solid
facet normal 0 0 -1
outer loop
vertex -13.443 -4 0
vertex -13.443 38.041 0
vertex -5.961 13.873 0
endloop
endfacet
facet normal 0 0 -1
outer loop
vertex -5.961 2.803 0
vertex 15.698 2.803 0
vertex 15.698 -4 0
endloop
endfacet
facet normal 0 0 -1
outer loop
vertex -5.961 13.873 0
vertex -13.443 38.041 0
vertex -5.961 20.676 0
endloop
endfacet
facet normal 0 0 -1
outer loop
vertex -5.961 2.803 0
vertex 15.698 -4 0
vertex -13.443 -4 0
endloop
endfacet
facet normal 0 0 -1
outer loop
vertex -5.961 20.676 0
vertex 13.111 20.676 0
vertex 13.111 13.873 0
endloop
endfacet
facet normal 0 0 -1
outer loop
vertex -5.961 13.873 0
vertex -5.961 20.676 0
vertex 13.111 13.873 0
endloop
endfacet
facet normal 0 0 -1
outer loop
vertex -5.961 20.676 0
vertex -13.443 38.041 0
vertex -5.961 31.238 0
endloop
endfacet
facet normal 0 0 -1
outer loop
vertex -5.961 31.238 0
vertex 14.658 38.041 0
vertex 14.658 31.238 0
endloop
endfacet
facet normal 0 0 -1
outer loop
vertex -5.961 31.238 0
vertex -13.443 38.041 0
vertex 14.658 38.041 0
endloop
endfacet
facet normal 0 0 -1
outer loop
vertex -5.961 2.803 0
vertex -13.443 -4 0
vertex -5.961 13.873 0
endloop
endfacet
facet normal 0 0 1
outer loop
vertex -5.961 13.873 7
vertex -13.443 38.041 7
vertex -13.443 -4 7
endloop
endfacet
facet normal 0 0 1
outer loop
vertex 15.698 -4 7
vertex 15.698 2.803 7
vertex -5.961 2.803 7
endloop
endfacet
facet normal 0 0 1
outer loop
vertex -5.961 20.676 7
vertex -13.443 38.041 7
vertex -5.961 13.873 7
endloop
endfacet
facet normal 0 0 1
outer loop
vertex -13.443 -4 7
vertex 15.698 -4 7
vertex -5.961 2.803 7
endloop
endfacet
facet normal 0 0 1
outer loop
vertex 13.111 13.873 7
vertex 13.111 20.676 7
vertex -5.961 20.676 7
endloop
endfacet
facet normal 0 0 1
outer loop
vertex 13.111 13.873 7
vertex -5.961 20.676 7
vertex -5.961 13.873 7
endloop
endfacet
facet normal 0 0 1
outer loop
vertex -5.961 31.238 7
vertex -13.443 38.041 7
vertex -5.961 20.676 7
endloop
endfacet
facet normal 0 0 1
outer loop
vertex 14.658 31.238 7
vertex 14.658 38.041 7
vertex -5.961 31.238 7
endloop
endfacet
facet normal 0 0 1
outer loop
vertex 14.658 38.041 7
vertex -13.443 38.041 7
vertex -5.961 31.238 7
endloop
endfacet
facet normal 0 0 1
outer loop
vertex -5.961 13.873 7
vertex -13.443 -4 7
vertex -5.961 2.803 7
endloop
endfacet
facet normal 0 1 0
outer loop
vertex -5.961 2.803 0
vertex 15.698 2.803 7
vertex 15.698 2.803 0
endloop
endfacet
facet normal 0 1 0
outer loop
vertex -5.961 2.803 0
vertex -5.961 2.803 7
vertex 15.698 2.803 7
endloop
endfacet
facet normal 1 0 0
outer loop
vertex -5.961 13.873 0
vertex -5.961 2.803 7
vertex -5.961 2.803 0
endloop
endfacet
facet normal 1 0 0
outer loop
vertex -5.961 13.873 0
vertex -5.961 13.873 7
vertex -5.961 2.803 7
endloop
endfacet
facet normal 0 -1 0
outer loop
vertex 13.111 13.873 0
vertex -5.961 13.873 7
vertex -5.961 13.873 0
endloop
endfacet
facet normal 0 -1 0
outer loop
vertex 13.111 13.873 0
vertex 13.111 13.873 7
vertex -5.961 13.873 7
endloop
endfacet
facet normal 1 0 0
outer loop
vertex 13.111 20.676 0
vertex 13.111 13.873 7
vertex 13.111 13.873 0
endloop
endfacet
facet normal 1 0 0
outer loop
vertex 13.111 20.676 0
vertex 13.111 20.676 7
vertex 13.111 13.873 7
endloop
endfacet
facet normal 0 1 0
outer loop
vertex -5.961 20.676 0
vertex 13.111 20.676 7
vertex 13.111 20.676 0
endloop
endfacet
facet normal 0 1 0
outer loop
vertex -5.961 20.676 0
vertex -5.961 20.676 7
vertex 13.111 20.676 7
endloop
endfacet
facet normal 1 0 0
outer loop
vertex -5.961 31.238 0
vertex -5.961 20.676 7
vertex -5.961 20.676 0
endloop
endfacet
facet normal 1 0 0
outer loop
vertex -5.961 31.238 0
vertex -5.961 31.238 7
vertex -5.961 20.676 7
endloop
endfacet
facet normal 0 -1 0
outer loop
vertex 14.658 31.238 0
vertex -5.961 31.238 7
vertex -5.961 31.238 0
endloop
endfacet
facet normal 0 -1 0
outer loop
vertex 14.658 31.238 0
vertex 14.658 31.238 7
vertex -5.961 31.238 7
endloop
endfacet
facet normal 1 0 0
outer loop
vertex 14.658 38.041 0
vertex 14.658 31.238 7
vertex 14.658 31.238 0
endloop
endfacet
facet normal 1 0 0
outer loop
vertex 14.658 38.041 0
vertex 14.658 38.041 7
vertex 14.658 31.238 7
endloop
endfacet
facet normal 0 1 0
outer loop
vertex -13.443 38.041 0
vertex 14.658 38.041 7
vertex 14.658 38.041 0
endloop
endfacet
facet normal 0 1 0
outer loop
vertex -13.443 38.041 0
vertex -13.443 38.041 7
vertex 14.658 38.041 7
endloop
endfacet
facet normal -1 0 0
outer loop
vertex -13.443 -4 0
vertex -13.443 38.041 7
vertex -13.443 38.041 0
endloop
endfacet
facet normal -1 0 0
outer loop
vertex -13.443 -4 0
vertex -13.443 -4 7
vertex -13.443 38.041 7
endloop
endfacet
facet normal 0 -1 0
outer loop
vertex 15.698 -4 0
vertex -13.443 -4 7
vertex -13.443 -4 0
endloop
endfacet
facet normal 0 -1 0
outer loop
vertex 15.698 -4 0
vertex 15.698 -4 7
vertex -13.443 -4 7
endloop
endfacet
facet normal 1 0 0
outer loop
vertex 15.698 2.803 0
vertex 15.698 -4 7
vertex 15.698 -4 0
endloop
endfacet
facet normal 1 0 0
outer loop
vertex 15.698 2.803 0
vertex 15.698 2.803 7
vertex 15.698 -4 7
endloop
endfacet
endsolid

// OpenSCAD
// file: glyph.scad
// glyph — the shared geometry of every letter in the set. Defines named geometry
// only, so it renders nothing on its own; each letter part includes it and calls
// letter(). Every dimension lives in ../../lib/common.scad.
//
// A LETTER IS NOTHING BUT A LETTER. No plinth, no tongue, no tab — it is the
// bare glyph, and it attaches by standing in the deck groove and resting on the
// groove's floor. Anything else on it would be a distraction on a learning toy.
//
// It is a flat plate of one thickness, printed face-down: no overhang anywhere,
// no supports, and the face on the bed comes out smoothest.
//
// TWO TRAPS WITH text():
//
//  * A missing font FALLS BACK SILENTLY — no warning, no error, just different
//    letters. "Liberation Sans" was the first choice here because OpenSCAD
//    bundles it; on macOS the bundled faces are not registered with fontconfig,
//    so it rendered the fallback face instead and nothing said so. To check a
//    font resolved, render a string with it and with a deliberately bogus name
//    and compare bounding boxes: identical means it fell back.
//  * `size` is not the cap height in general. For Helvetica Bold they coincide
//    (size 44 -> 44.0 mm cap), which is why letter_size reads as a height.
//    Change the font and re-measure.

include <../../lib/common.scad>

// The letter's outline, upright in the XY plane, ready to be extruded along Z
// (which is the letter's thickness, and the print's build axis).
//
//   y = 0   is the deck surface
//   y < 0   is the part standing down inside the groove. It reaches letter_bury,
//           which is where the tapered groove closes to letter_t — NOT the
//           groove's floor. The letter wedges; it never bottoms out.
module glyph_2d(ch) {
    intersection() {
        translate([0, -letter_bury])
            scale([letter_condense, 1])
                text(ch, size = letter_size, font = letter_font,
                     halign = "center", valign = "baseline");
        // Trimmed flat at the baseline. Round letters (O, C, G, S) overshoot the
        // baseline by design, and a letter standing on a convex curve rocks —
        // there is nothing to stop it leaning. The trim costs nothing visible
        // and gives every letter a flat foot on the groove floor.
        translate([-200, -letter_bury]) square([400, 400]);
    }
}

// One letter, in its print orientation: lying on its face, thickness up Z.
module letter(ch) {
    linear_extrude(letter_t) glyph_2d(ch);
}

// Where that letter sits once it is dropped into a chassis, for fit checks.
module letter_fitted(ch) {
    translate([0, letter_t/2, body_top]) rotate([90, 0, 0]) letter(ch);
}
// main file
// letter E — one part. See glyph.scad for the geometry and lib/common.scad for
// the dimensions. Prints lying on its face, exactly as exported: no supports.

include <glyph.scad>

letter("E");
